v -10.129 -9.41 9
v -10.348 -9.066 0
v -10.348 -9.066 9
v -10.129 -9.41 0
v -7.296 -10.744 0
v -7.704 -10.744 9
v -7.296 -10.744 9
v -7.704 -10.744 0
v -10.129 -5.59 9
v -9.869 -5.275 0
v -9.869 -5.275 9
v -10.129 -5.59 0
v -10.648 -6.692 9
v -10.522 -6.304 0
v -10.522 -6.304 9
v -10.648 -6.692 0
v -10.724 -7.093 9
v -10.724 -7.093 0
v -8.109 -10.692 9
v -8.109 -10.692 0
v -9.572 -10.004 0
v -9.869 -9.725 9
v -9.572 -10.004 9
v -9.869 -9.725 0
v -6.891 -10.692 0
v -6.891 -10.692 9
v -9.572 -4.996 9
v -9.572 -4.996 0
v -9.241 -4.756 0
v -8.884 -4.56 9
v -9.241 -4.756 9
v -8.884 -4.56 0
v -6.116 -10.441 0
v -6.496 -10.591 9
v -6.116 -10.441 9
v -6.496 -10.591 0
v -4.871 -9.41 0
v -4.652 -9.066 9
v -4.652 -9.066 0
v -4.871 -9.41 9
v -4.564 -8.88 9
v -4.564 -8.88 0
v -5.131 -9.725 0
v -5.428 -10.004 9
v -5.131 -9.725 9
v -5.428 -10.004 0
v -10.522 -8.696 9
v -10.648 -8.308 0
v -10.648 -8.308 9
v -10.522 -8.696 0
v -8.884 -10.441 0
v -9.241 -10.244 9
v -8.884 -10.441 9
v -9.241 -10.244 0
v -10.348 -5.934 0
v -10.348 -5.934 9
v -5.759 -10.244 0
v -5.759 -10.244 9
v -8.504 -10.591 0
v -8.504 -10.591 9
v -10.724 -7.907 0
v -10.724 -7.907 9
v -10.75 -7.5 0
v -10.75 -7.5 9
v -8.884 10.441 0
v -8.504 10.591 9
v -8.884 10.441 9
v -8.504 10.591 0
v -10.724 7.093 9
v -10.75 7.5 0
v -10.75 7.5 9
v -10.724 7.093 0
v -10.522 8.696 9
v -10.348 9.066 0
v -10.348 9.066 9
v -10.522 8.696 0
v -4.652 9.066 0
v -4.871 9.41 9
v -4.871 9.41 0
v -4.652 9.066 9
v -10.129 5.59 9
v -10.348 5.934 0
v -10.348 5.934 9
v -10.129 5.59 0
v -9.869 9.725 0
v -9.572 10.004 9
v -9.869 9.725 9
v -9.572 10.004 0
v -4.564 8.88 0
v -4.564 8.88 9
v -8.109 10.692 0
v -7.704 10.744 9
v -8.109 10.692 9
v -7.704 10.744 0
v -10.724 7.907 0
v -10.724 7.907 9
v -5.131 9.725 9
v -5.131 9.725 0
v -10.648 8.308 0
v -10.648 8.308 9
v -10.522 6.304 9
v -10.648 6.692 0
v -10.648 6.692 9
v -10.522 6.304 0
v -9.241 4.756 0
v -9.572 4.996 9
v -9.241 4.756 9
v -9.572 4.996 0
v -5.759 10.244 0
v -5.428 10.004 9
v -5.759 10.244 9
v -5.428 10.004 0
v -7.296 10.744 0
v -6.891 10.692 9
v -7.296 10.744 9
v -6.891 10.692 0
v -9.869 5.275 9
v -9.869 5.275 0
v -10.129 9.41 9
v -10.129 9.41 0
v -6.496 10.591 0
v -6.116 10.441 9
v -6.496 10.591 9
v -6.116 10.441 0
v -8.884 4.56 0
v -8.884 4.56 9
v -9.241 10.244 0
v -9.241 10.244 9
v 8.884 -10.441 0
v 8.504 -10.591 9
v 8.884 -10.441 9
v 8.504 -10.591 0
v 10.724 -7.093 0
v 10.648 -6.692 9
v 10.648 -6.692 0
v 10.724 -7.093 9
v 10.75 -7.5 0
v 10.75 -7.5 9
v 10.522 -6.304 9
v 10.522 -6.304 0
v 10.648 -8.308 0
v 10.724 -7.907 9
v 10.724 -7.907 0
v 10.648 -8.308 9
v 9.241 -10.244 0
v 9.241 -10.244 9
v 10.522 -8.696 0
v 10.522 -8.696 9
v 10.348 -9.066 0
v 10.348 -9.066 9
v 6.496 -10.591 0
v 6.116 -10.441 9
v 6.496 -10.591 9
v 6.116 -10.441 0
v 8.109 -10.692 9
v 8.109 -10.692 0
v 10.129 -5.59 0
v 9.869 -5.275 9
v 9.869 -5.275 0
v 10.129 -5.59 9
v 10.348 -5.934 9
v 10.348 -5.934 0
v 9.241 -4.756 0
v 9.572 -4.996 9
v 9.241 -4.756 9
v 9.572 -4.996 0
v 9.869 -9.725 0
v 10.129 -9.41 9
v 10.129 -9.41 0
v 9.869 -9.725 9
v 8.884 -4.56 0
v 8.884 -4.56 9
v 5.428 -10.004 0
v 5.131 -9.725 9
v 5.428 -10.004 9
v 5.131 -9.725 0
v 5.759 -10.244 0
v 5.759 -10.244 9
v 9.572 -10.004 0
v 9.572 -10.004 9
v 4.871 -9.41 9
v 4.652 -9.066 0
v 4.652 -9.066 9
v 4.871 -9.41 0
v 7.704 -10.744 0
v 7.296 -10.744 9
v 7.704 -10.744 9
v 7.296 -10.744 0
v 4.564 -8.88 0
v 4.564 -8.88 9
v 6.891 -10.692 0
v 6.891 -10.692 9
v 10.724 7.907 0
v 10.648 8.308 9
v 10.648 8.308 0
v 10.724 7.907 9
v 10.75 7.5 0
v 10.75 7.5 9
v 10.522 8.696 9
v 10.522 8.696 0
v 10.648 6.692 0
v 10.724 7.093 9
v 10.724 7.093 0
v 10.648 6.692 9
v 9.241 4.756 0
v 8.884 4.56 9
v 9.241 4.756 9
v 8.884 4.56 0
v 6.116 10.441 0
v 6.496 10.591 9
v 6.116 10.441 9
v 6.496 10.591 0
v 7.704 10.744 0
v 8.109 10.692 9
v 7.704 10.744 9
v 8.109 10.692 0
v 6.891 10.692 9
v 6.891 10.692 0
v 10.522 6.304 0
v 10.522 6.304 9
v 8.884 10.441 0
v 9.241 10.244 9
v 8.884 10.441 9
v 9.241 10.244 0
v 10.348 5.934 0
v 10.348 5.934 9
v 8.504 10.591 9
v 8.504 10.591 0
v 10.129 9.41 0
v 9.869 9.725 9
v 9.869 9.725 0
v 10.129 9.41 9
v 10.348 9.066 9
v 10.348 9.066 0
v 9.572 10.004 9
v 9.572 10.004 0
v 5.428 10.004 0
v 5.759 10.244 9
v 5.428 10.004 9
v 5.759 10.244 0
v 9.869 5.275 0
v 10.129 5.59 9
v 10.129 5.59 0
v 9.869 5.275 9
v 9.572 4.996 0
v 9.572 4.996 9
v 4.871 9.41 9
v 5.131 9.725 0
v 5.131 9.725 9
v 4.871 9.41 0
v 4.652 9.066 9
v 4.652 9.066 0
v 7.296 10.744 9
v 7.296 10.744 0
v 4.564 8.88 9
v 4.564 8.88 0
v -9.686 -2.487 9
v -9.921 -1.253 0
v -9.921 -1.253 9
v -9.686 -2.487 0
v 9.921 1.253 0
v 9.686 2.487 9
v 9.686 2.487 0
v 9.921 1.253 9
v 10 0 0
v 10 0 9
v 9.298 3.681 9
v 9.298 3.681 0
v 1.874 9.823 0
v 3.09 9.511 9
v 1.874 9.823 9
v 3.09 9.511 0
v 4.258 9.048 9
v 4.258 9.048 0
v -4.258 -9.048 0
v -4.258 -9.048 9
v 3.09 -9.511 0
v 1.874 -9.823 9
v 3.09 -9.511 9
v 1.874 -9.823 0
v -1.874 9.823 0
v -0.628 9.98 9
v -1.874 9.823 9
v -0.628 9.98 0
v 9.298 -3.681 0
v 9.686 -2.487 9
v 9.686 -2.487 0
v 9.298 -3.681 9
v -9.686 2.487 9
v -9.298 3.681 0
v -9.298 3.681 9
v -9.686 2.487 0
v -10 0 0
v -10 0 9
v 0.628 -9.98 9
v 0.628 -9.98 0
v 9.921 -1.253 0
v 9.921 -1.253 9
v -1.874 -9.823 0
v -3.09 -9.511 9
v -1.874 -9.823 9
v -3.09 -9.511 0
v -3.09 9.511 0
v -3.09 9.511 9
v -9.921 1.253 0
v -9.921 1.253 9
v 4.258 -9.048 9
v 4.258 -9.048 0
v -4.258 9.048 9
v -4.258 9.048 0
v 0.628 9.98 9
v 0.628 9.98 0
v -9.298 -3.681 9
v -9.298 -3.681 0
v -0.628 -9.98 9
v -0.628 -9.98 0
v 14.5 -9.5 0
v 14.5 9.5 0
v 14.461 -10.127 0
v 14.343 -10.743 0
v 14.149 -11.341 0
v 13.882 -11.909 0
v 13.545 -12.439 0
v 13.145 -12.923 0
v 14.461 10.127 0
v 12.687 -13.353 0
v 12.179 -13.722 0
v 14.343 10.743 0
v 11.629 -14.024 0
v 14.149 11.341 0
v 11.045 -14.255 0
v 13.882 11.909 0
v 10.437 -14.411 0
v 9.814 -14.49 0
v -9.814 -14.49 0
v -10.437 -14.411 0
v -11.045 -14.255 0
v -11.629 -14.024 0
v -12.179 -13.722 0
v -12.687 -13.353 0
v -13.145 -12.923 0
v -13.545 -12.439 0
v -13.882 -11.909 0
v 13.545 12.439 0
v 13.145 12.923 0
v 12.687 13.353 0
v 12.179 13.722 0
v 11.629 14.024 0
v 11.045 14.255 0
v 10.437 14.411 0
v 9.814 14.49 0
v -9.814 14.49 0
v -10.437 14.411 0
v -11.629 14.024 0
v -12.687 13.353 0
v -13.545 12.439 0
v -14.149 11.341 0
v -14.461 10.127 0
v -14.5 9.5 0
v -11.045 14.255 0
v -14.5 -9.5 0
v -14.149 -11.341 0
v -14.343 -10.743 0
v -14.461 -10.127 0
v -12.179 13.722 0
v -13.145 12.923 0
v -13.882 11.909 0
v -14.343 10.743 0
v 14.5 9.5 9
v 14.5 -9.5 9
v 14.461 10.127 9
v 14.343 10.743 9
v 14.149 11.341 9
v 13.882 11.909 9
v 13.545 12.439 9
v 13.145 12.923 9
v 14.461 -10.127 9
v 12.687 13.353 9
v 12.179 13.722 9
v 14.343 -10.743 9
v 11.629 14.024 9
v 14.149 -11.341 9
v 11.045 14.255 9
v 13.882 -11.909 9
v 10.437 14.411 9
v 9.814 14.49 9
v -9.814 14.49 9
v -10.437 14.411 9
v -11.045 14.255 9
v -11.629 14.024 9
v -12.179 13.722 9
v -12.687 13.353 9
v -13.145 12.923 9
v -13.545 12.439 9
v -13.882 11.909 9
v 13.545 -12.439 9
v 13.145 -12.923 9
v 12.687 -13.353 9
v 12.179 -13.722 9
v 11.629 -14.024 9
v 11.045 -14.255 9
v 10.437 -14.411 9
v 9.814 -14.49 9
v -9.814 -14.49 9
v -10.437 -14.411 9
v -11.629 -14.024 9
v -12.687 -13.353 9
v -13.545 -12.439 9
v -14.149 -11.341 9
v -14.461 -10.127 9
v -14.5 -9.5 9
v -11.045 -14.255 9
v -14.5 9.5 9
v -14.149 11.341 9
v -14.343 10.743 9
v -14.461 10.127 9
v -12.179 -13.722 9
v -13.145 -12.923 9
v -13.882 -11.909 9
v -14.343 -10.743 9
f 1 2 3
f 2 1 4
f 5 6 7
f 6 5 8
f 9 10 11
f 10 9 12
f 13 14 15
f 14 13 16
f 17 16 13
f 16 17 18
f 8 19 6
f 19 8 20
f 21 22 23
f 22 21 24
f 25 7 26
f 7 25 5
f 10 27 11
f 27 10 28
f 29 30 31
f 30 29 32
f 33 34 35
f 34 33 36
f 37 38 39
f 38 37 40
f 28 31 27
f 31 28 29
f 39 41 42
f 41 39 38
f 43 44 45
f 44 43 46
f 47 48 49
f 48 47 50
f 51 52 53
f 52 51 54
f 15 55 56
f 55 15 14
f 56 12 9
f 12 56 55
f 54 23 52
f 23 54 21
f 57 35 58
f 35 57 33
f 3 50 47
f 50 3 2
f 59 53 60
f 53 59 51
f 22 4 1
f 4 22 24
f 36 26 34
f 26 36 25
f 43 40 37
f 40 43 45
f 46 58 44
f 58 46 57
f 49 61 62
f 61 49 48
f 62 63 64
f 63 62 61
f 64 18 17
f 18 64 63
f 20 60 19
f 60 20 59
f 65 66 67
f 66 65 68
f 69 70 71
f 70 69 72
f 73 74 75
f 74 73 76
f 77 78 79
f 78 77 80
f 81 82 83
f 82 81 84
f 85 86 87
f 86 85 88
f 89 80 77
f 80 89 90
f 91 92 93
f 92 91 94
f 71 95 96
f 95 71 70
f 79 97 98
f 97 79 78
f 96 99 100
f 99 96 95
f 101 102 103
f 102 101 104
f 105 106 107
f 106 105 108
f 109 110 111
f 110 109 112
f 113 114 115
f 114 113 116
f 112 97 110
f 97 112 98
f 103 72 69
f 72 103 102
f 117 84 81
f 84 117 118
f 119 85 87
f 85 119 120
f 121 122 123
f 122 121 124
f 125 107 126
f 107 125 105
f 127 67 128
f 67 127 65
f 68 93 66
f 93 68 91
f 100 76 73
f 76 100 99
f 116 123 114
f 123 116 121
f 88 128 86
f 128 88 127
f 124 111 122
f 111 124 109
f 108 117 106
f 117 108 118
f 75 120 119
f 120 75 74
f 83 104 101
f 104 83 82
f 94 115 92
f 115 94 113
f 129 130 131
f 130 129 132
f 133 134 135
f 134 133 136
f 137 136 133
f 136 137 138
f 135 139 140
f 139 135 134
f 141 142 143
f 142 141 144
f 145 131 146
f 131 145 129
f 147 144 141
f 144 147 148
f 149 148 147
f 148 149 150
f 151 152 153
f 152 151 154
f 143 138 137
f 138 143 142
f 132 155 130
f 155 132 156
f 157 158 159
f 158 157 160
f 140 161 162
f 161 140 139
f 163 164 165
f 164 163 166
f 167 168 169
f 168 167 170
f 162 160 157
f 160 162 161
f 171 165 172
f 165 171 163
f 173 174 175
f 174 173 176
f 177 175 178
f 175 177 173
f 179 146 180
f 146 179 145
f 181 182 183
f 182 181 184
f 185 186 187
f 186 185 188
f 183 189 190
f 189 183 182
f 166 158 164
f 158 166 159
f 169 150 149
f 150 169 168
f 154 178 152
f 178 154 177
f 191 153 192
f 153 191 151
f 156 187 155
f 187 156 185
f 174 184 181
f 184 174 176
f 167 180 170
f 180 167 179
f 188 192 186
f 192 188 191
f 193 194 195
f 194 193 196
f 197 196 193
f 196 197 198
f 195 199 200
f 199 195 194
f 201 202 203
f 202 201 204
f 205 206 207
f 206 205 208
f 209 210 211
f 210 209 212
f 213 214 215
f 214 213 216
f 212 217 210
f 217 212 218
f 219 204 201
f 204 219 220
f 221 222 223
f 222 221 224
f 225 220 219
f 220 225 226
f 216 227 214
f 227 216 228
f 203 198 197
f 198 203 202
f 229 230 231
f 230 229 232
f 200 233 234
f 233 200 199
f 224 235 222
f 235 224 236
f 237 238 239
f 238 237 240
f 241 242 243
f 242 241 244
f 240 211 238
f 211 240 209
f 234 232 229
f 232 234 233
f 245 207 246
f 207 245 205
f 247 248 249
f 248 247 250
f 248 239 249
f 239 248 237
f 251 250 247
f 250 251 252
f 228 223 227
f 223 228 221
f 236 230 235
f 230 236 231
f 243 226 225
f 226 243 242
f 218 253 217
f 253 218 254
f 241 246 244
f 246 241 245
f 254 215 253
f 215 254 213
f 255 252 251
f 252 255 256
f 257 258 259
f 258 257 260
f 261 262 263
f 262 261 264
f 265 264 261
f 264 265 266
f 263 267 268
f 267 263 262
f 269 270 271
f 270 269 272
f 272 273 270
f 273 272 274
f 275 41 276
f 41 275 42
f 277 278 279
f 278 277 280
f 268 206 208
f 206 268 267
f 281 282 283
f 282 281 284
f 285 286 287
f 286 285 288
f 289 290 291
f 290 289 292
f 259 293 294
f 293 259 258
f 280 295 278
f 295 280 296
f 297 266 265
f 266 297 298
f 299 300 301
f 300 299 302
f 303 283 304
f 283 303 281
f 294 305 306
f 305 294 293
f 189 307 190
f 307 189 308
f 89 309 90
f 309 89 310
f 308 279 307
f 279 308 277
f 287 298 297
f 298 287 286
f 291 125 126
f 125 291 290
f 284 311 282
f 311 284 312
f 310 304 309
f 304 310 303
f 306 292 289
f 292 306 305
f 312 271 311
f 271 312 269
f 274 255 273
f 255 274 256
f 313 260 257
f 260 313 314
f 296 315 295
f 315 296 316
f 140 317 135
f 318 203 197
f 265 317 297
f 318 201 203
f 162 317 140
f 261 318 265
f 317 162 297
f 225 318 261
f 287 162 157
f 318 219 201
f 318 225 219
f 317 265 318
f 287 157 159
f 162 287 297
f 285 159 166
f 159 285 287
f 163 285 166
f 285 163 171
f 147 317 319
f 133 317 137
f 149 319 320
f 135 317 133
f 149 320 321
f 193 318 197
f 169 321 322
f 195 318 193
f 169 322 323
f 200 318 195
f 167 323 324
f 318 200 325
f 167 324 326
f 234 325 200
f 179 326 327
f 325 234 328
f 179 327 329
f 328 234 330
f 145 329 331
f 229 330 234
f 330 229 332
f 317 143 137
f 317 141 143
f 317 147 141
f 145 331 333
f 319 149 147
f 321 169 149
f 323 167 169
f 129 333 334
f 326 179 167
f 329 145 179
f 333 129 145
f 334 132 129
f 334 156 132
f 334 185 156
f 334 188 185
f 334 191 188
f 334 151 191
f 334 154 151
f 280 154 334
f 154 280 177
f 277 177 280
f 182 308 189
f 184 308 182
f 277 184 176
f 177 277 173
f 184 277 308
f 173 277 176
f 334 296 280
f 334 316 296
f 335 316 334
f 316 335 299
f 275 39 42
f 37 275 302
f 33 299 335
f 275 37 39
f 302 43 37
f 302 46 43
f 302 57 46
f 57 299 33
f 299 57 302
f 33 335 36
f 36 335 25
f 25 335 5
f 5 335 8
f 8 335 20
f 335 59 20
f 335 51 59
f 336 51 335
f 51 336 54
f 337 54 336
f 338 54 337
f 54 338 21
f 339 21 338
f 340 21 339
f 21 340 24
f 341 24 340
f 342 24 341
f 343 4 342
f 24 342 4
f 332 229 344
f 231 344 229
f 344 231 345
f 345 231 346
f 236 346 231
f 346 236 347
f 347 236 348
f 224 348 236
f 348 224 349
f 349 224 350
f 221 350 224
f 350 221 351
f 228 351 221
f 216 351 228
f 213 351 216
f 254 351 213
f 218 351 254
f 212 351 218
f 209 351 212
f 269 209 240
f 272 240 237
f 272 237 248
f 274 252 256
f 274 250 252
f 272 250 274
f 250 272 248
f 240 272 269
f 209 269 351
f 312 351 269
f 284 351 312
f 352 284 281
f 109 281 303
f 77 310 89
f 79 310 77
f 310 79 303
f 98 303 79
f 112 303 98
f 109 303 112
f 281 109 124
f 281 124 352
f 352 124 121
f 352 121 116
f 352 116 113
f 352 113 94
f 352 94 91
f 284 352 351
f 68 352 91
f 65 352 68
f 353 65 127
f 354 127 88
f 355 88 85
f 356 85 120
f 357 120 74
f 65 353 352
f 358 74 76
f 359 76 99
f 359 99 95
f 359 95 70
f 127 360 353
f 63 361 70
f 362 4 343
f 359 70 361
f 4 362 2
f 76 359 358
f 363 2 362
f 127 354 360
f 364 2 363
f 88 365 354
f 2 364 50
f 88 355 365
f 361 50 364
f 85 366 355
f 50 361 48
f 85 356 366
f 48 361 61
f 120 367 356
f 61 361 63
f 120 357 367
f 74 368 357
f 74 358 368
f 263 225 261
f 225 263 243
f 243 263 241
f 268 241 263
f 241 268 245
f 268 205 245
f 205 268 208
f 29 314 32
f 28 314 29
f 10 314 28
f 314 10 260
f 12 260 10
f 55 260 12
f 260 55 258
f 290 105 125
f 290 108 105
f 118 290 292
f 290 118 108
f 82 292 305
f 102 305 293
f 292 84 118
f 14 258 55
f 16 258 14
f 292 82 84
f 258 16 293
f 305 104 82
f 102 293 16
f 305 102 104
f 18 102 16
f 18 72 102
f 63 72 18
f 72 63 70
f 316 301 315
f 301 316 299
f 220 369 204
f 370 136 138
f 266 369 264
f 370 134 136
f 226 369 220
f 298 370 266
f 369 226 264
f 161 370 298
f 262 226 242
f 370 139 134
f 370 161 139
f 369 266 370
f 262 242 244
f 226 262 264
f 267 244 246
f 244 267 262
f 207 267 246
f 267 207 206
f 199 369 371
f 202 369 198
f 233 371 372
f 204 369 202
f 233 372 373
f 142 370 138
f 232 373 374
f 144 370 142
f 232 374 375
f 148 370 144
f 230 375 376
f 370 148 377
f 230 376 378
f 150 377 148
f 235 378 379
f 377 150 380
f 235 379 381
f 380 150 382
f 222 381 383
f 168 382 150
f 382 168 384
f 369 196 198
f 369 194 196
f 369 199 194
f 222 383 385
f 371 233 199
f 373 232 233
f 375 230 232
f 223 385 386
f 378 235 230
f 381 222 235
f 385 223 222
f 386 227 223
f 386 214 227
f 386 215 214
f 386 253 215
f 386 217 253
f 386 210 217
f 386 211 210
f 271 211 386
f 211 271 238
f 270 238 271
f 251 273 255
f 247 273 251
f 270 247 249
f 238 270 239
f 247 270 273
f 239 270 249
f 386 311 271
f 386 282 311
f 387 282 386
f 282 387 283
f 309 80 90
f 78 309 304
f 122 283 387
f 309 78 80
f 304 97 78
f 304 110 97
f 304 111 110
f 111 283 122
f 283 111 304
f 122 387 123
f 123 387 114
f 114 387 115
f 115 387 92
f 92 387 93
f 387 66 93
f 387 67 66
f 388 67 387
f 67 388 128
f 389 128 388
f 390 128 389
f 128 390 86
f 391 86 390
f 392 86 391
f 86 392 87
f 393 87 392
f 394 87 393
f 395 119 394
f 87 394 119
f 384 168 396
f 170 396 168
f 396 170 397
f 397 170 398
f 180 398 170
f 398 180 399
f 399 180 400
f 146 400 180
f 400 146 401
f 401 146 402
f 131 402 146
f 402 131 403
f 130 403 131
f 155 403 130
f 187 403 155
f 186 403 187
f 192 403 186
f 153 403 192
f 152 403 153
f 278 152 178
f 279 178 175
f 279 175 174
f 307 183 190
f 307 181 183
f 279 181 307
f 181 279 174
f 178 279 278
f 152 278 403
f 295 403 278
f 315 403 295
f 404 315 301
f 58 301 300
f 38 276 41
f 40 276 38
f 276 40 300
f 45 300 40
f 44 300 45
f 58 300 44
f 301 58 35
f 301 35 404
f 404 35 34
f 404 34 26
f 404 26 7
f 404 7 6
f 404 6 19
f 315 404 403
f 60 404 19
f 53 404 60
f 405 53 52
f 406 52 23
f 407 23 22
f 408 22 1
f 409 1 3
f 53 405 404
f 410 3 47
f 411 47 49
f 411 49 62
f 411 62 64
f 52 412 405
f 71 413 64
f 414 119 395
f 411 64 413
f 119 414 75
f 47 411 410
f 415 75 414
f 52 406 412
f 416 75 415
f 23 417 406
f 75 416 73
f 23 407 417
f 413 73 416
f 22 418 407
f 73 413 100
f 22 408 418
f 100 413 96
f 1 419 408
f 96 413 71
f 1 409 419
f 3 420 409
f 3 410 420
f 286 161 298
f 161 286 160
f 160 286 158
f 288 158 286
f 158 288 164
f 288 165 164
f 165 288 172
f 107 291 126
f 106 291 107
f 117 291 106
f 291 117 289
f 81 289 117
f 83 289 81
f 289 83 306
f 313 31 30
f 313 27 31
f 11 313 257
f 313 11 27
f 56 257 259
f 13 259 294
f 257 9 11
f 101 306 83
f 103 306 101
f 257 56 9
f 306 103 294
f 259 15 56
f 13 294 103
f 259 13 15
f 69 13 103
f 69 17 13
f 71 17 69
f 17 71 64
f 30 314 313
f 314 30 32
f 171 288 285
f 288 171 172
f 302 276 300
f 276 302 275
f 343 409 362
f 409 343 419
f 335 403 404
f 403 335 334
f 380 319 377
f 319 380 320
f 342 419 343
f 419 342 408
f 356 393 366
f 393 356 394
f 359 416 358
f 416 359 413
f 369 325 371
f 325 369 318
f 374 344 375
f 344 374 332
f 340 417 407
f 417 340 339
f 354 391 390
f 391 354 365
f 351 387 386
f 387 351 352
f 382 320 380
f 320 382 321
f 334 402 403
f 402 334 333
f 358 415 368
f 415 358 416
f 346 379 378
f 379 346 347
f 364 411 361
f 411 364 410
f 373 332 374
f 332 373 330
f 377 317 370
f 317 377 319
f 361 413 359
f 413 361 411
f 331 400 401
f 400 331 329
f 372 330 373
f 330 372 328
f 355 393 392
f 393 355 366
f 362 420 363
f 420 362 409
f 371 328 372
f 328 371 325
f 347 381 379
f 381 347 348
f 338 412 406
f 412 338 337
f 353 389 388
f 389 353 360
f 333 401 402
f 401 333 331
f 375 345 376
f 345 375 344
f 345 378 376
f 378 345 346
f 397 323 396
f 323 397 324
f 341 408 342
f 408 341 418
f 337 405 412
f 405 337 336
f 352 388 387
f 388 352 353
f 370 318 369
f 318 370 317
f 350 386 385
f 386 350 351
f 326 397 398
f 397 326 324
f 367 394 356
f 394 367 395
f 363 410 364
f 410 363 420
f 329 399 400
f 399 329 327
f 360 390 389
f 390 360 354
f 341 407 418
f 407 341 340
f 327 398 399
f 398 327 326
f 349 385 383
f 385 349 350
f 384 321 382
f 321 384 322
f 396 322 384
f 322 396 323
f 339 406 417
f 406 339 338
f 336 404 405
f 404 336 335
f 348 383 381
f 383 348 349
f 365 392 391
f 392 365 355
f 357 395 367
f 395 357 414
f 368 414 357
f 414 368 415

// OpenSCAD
$fn = 50;


difference() {
	union() {
		hull() {
			translate(v = [-9.5000000000, 9.5000000000, 0]) {
				cylinder(h = 9, r = 5);
			}
			translate(v = [9.5000000000, 9.5000000000, 0]) {
				cylinder(h = 9, r = 5);
			}
			translate(v = [-9.5000000000, -9.5000000000, 0]) {
				cylinder(h = 9, r = 5);
			}
			translate(v = [9.5000000000, -9.5000000000, 0]) {
				cylinder(h = 9, r = 5);
			}
		}
	}
	union() {
		#translate(v = [-7.5000000000, -7.5000000000, -100.0000000000]) {
			cylinder(h = 200, r = 3.2500000000);
		}
		#translate(v = [-7.5000000000, 7.5000000000, -100.0000000000]) {
			cylinder(h = 200, r = 3.2500000000);
		}
		#translate(v = [7.5000000000, -7.5000000000, -100.0000000000]) {
			cylinder(h = 200, r = 3.2500000000);
		}
		#translate(v = [7.5000000000, 7.5000000000, -100.0000000000]) {
			cylinder(h = 200, r = 3.2500000000);
		}
		#cylinder(h = 9, r = 10.0000000000);
	}
}
